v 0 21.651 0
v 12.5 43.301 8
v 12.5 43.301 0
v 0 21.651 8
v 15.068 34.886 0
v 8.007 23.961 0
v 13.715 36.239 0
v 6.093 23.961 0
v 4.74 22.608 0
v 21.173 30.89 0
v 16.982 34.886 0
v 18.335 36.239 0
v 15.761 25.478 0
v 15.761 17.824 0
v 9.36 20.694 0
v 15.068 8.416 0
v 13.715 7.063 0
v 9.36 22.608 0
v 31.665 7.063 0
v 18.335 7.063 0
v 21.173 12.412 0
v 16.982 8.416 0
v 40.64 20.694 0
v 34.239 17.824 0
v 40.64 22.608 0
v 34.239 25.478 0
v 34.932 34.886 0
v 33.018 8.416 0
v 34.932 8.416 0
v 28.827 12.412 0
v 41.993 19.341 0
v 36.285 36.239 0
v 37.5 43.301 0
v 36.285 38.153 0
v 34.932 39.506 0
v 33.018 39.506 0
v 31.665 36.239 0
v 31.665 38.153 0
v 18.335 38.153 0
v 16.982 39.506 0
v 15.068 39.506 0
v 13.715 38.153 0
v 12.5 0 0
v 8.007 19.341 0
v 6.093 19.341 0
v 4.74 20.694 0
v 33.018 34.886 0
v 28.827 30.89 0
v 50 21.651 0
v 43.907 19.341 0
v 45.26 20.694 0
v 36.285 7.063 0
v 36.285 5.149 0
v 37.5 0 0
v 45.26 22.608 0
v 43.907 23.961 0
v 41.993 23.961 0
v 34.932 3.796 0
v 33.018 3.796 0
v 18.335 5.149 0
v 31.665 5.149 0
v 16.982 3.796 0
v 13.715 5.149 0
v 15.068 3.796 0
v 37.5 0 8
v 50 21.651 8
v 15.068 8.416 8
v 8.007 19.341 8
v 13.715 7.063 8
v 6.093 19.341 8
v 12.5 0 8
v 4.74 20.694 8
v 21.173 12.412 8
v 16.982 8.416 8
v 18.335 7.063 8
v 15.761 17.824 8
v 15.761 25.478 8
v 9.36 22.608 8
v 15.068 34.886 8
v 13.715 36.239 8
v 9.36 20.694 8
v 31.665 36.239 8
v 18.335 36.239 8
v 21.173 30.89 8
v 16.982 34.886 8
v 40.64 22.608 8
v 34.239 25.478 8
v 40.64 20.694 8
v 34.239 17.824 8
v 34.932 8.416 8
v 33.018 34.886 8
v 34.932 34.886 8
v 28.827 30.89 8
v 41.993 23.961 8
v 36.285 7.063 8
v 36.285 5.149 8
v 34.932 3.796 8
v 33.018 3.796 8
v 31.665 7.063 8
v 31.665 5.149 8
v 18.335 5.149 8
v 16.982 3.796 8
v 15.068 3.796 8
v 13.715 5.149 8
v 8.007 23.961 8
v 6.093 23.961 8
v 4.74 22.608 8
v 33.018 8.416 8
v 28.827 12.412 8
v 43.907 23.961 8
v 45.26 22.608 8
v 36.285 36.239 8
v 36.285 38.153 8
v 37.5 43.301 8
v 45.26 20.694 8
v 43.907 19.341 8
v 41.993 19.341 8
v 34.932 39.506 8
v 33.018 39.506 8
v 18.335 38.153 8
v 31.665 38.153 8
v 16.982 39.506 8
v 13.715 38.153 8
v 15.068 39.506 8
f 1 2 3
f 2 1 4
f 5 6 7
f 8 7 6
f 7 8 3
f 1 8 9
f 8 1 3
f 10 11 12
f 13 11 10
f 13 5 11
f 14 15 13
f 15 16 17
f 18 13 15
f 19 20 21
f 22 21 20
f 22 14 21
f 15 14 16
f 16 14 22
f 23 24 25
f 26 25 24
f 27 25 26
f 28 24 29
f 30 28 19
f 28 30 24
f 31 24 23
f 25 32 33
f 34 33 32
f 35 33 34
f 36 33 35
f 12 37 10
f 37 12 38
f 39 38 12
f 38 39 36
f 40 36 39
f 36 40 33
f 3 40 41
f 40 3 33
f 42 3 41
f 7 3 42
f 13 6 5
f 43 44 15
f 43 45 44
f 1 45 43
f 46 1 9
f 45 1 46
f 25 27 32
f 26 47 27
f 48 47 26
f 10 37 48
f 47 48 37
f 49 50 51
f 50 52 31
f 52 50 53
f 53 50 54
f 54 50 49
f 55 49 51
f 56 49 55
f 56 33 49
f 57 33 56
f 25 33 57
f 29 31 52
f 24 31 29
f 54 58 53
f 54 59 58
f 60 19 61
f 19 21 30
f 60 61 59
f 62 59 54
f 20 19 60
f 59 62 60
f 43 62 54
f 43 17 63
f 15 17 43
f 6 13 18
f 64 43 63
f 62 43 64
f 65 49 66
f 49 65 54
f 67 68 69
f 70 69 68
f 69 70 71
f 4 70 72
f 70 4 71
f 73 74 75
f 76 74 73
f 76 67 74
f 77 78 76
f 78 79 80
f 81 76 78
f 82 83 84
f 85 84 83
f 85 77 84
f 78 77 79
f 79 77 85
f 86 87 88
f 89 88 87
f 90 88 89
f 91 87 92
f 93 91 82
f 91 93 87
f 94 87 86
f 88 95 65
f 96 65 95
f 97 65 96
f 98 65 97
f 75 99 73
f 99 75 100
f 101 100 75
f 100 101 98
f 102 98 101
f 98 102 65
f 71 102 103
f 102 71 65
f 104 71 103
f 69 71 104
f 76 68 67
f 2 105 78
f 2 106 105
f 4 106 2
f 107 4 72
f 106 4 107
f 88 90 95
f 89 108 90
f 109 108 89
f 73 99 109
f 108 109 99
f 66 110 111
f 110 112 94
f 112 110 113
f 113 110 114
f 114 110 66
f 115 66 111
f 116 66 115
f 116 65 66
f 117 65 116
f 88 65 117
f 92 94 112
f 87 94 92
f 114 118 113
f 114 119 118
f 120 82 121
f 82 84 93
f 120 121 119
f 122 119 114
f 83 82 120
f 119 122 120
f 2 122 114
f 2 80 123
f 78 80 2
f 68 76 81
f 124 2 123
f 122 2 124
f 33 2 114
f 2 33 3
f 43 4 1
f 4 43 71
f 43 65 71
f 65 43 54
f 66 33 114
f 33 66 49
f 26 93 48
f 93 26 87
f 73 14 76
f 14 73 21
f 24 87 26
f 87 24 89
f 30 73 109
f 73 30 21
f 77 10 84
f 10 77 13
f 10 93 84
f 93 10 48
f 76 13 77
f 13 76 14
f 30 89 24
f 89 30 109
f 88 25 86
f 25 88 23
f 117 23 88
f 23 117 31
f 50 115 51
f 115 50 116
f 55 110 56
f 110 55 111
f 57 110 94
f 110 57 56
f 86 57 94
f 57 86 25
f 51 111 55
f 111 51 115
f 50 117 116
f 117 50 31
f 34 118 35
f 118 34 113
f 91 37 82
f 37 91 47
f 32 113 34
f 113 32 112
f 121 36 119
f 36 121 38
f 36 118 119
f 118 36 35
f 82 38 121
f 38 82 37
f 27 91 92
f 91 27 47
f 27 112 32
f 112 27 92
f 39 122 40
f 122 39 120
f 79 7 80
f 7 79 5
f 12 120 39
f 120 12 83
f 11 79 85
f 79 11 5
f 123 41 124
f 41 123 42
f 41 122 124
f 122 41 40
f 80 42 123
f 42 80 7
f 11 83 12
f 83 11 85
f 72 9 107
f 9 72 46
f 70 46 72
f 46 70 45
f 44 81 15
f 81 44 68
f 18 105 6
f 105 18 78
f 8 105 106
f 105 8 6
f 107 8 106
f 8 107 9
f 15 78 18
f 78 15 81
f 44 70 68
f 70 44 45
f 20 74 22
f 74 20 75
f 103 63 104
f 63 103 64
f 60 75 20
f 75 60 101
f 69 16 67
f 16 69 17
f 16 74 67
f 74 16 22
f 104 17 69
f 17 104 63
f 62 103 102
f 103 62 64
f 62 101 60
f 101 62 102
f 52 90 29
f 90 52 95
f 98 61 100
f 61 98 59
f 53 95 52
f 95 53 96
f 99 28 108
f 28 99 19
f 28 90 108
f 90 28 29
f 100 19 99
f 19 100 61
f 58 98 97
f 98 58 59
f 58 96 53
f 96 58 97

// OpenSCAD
$fn = 32;

// ----------------------------------------------------------------------
// Polygon plate: 6-gon R25, 6 bolt windows
// ----------------------------------------------------------------------

// --- parameters (mm) ---
sides = 6;                // number of polygon sides
plate_r = 25;             // circumscribed radius of the polygon
bore_r = 10;              // centre bore radius
bolts = 6;                // number of bolt windows
ring_r = 17.95;           // bolt-circle radius
bolt_r = 2.5;             // bolt window radius
plate_t = 8;              // plate thickness, Z (extrusion height)

plate_d = 2 * plate_r;  // circumscribed diameter
bore_d = 2 * bore_r;  // centre bore diameter
bolt_d = 2 * bolt_r;  // bolt window diameter
ring_d = 2 * ring_r;  // bolt-circle diameter

profile = [[50, 21.651], [37.5, 43.301], [12.5, 43.301], [0, 21.651], [12.5, 0], [37.5, 0]];  // primary outline, 6 points, counter clockwise
void_1 = [[34.239, 25.478], [28.827, 30.89], [21.173, 30.89], [15.761, 25.478], [15.761, 17.824], [21.173, 12.412], [28.827, 12.412], [34.239, 17.824]];  // centre bore, 8 points
void_2 = [[45.26, 22.608], [43.907, 23.961], [41.993, 23.961], [40.64, 22.608], [40.64, 20.694], [41.993, 19.341], [43.907, 19.341], [45.26, 20.694]];  // bolt window 1, 8 points
void_3 = [[36.285, 38.153], [34.932, 39.506], [33.018, 39.506], [31.665, 38.153], [31.665, 36.239], [33.018, 34.886], [34.932, 34.886], [36.285, 36.239]];  // bolt window 2, 8 points
void_4 = [[18.335, 38.153], [16.982, 39.506], [15.068, 39.506], [13.715, 38.153], [13.715, 36.239], [15.068, 34.886], [16.982, 34.886], [18.335, 36.239]];  // bolt window 3, 8 points
void_5 = [[9.36, 22.608], [8.007, 23.961], [6.093, 23.961], [4.74, 22.608], [4.74, 20.694], [6.093, 19.341], [8.007, 19.341], [9.36, 20.694]];  // bolt window 4, 8 points
void_6 = [[18.335, 7.063], [16.982, 8.416], [15.068, 8.416], [13.715, 7.063], [13.715, 5.149], [15.068, 3.796], [16.982, 3.796], [18.335, 5.149]];  // bolt window 5, 8 points
void_7 = [[36.285, 7.063], [34.932, 8.416], [33.018, 8.416], [31.665, 7.063], [31.665, 5.149], [33.018, 3.796], [34.932, 3.796], [36.285, 5.149]];  // bolt window 6, 8 points

// --- the one profile operation ---
difference() {
  linear_extrude(height = plate_t) polygon(points = profile);
  translate([0, 0, -1])
    linear_extrude(height = plate_t + 2) polygon(points = void_1);
  translate([0, 0, -1])
    linear_extrude(height = plate_t + 2) polygon(points = void_2);
  translate([0, 0, -1])
    linear_extrude(height = plate_t + 2) polygon(points = void_3);
  translate([0, 0, -1])
    linear_extrude(height = plate_t + 2) polygon(points = void_4);
  translate([0, 0, -1])
    linear_extrude(height = plate_t + 2) polygon(points = void_5);
  translate([0, 0, -1])
    linear_extrude(height = plate_t + 2) polygon(points = void_6);
  translate([0, 0, -1])
    linear_extrude(height = plate_t + 2) polygon(points = void_7);
}
